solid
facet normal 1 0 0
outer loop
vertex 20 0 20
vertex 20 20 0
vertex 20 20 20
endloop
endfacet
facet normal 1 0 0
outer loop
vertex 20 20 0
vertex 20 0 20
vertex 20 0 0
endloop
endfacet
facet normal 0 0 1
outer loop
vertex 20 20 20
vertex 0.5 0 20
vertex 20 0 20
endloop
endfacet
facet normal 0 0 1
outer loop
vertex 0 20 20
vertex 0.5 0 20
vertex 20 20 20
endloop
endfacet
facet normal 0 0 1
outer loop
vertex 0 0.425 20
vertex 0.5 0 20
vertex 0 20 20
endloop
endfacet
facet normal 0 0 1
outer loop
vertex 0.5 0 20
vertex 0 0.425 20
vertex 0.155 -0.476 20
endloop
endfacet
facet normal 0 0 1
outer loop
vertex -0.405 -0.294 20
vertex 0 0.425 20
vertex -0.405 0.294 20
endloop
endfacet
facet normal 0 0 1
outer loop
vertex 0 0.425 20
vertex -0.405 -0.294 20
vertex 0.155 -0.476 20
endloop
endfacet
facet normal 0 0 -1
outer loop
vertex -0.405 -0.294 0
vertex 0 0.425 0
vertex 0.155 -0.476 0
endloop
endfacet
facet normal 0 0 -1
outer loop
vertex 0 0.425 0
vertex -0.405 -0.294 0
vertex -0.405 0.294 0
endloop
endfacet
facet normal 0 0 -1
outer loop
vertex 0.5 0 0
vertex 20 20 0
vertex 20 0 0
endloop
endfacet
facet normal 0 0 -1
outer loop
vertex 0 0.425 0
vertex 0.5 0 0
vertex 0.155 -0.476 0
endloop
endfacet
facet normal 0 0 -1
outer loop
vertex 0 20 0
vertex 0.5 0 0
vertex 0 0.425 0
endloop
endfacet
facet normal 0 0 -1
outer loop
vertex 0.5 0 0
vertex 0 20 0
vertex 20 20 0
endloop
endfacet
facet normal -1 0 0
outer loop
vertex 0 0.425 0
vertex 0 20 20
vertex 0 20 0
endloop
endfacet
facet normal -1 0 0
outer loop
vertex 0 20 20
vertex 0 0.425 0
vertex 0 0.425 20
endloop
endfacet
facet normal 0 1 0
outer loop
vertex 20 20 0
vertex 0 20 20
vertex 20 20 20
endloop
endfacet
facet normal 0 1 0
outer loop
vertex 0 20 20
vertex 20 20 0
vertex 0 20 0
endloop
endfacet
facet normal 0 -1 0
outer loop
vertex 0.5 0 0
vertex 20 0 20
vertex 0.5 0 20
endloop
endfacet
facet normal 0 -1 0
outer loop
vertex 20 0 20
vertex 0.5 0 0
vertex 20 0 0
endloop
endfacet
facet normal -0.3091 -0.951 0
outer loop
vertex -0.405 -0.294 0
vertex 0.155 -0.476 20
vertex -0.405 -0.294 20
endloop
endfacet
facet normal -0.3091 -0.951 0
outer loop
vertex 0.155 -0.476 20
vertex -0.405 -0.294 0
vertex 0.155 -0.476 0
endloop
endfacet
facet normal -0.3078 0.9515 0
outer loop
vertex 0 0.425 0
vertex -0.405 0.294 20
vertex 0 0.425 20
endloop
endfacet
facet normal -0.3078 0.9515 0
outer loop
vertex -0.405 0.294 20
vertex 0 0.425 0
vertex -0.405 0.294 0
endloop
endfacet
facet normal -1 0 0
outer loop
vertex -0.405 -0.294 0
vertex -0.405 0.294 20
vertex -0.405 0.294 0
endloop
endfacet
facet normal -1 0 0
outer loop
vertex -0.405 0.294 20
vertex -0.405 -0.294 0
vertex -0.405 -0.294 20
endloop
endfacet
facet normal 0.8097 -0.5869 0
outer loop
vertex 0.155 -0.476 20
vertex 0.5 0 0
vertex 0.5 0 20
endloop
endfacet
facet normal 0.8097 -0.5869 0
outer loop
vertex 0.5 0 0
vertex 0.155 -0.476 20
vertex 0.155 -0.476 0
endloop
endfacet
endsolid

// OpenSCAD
    // Measurement tools test
    module show_bbox(points) {
        min_point = [min([for (p = points) p[0]]), min([for (p = points) p[1]]), min([for (p = points) p[2]])];
        max_point = [max([for (p = points) p[0]]), max([for (p = points) p[1]]), max([for (p = points) p[2]])];
        translate(min_point)
            %cube(max_point - min_point);
    }
    
    module dimension_line(start, end, offset=5) {
        vector = end - start;
        length = norm(vector);
        translate(start)
            rotate([0, 0, atan2(vector[1], vector[0])])
                union() {
                    cylinder(h=length, r=0.5, center=false);
                    translate([0, offset, 0])
                        text(str(length), size=5);
                }
    }
    
    // Test object
    cube(20);
    
    // Show measurements
    points = [[0,0,0], [20,0,0], [20,20,0], [0,20,0]];
    show_bbox(points);
    dimension_line([0,0,0], [20,0,0]);
    
